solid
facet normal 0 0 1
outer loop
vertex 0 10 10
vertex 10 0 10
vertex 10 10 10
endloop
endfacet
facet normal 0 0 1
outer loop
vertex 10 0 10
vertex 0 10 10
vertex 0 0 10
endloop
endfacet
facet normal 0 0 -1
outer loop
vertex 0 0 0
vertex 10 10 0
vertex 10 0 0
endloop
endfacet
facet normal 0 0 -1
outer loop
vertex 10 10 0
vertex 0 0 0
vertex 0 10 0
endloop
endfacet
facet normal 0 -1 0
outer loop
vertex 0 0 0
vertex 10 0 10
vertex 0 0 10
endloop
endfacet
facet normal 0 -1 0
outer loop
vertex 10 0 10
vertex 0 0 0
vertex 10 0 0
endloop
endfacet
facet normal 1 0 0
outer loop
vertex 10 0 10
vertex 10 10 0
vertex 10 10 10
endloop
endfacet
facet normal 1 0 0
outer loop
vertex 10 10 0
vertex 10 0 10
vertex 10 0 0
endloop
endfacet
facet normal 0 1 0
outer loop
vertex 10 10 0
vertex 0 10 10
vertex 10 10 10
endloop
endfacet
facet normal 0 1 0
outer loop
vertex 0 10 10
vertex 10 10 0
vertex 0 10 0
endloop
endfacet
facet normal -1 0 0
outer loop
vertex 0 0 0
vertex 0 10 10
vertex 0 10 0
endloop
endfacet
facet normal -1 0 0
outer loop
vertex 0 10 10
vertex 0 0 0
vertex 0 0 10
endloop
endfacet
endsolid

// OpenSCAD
/*
 * The disable modifier (*) hides the object from the view.
 */

cube([10, 10, 10]);

*translate([5, 5, 5])
    cube([10, 10, 10]);
